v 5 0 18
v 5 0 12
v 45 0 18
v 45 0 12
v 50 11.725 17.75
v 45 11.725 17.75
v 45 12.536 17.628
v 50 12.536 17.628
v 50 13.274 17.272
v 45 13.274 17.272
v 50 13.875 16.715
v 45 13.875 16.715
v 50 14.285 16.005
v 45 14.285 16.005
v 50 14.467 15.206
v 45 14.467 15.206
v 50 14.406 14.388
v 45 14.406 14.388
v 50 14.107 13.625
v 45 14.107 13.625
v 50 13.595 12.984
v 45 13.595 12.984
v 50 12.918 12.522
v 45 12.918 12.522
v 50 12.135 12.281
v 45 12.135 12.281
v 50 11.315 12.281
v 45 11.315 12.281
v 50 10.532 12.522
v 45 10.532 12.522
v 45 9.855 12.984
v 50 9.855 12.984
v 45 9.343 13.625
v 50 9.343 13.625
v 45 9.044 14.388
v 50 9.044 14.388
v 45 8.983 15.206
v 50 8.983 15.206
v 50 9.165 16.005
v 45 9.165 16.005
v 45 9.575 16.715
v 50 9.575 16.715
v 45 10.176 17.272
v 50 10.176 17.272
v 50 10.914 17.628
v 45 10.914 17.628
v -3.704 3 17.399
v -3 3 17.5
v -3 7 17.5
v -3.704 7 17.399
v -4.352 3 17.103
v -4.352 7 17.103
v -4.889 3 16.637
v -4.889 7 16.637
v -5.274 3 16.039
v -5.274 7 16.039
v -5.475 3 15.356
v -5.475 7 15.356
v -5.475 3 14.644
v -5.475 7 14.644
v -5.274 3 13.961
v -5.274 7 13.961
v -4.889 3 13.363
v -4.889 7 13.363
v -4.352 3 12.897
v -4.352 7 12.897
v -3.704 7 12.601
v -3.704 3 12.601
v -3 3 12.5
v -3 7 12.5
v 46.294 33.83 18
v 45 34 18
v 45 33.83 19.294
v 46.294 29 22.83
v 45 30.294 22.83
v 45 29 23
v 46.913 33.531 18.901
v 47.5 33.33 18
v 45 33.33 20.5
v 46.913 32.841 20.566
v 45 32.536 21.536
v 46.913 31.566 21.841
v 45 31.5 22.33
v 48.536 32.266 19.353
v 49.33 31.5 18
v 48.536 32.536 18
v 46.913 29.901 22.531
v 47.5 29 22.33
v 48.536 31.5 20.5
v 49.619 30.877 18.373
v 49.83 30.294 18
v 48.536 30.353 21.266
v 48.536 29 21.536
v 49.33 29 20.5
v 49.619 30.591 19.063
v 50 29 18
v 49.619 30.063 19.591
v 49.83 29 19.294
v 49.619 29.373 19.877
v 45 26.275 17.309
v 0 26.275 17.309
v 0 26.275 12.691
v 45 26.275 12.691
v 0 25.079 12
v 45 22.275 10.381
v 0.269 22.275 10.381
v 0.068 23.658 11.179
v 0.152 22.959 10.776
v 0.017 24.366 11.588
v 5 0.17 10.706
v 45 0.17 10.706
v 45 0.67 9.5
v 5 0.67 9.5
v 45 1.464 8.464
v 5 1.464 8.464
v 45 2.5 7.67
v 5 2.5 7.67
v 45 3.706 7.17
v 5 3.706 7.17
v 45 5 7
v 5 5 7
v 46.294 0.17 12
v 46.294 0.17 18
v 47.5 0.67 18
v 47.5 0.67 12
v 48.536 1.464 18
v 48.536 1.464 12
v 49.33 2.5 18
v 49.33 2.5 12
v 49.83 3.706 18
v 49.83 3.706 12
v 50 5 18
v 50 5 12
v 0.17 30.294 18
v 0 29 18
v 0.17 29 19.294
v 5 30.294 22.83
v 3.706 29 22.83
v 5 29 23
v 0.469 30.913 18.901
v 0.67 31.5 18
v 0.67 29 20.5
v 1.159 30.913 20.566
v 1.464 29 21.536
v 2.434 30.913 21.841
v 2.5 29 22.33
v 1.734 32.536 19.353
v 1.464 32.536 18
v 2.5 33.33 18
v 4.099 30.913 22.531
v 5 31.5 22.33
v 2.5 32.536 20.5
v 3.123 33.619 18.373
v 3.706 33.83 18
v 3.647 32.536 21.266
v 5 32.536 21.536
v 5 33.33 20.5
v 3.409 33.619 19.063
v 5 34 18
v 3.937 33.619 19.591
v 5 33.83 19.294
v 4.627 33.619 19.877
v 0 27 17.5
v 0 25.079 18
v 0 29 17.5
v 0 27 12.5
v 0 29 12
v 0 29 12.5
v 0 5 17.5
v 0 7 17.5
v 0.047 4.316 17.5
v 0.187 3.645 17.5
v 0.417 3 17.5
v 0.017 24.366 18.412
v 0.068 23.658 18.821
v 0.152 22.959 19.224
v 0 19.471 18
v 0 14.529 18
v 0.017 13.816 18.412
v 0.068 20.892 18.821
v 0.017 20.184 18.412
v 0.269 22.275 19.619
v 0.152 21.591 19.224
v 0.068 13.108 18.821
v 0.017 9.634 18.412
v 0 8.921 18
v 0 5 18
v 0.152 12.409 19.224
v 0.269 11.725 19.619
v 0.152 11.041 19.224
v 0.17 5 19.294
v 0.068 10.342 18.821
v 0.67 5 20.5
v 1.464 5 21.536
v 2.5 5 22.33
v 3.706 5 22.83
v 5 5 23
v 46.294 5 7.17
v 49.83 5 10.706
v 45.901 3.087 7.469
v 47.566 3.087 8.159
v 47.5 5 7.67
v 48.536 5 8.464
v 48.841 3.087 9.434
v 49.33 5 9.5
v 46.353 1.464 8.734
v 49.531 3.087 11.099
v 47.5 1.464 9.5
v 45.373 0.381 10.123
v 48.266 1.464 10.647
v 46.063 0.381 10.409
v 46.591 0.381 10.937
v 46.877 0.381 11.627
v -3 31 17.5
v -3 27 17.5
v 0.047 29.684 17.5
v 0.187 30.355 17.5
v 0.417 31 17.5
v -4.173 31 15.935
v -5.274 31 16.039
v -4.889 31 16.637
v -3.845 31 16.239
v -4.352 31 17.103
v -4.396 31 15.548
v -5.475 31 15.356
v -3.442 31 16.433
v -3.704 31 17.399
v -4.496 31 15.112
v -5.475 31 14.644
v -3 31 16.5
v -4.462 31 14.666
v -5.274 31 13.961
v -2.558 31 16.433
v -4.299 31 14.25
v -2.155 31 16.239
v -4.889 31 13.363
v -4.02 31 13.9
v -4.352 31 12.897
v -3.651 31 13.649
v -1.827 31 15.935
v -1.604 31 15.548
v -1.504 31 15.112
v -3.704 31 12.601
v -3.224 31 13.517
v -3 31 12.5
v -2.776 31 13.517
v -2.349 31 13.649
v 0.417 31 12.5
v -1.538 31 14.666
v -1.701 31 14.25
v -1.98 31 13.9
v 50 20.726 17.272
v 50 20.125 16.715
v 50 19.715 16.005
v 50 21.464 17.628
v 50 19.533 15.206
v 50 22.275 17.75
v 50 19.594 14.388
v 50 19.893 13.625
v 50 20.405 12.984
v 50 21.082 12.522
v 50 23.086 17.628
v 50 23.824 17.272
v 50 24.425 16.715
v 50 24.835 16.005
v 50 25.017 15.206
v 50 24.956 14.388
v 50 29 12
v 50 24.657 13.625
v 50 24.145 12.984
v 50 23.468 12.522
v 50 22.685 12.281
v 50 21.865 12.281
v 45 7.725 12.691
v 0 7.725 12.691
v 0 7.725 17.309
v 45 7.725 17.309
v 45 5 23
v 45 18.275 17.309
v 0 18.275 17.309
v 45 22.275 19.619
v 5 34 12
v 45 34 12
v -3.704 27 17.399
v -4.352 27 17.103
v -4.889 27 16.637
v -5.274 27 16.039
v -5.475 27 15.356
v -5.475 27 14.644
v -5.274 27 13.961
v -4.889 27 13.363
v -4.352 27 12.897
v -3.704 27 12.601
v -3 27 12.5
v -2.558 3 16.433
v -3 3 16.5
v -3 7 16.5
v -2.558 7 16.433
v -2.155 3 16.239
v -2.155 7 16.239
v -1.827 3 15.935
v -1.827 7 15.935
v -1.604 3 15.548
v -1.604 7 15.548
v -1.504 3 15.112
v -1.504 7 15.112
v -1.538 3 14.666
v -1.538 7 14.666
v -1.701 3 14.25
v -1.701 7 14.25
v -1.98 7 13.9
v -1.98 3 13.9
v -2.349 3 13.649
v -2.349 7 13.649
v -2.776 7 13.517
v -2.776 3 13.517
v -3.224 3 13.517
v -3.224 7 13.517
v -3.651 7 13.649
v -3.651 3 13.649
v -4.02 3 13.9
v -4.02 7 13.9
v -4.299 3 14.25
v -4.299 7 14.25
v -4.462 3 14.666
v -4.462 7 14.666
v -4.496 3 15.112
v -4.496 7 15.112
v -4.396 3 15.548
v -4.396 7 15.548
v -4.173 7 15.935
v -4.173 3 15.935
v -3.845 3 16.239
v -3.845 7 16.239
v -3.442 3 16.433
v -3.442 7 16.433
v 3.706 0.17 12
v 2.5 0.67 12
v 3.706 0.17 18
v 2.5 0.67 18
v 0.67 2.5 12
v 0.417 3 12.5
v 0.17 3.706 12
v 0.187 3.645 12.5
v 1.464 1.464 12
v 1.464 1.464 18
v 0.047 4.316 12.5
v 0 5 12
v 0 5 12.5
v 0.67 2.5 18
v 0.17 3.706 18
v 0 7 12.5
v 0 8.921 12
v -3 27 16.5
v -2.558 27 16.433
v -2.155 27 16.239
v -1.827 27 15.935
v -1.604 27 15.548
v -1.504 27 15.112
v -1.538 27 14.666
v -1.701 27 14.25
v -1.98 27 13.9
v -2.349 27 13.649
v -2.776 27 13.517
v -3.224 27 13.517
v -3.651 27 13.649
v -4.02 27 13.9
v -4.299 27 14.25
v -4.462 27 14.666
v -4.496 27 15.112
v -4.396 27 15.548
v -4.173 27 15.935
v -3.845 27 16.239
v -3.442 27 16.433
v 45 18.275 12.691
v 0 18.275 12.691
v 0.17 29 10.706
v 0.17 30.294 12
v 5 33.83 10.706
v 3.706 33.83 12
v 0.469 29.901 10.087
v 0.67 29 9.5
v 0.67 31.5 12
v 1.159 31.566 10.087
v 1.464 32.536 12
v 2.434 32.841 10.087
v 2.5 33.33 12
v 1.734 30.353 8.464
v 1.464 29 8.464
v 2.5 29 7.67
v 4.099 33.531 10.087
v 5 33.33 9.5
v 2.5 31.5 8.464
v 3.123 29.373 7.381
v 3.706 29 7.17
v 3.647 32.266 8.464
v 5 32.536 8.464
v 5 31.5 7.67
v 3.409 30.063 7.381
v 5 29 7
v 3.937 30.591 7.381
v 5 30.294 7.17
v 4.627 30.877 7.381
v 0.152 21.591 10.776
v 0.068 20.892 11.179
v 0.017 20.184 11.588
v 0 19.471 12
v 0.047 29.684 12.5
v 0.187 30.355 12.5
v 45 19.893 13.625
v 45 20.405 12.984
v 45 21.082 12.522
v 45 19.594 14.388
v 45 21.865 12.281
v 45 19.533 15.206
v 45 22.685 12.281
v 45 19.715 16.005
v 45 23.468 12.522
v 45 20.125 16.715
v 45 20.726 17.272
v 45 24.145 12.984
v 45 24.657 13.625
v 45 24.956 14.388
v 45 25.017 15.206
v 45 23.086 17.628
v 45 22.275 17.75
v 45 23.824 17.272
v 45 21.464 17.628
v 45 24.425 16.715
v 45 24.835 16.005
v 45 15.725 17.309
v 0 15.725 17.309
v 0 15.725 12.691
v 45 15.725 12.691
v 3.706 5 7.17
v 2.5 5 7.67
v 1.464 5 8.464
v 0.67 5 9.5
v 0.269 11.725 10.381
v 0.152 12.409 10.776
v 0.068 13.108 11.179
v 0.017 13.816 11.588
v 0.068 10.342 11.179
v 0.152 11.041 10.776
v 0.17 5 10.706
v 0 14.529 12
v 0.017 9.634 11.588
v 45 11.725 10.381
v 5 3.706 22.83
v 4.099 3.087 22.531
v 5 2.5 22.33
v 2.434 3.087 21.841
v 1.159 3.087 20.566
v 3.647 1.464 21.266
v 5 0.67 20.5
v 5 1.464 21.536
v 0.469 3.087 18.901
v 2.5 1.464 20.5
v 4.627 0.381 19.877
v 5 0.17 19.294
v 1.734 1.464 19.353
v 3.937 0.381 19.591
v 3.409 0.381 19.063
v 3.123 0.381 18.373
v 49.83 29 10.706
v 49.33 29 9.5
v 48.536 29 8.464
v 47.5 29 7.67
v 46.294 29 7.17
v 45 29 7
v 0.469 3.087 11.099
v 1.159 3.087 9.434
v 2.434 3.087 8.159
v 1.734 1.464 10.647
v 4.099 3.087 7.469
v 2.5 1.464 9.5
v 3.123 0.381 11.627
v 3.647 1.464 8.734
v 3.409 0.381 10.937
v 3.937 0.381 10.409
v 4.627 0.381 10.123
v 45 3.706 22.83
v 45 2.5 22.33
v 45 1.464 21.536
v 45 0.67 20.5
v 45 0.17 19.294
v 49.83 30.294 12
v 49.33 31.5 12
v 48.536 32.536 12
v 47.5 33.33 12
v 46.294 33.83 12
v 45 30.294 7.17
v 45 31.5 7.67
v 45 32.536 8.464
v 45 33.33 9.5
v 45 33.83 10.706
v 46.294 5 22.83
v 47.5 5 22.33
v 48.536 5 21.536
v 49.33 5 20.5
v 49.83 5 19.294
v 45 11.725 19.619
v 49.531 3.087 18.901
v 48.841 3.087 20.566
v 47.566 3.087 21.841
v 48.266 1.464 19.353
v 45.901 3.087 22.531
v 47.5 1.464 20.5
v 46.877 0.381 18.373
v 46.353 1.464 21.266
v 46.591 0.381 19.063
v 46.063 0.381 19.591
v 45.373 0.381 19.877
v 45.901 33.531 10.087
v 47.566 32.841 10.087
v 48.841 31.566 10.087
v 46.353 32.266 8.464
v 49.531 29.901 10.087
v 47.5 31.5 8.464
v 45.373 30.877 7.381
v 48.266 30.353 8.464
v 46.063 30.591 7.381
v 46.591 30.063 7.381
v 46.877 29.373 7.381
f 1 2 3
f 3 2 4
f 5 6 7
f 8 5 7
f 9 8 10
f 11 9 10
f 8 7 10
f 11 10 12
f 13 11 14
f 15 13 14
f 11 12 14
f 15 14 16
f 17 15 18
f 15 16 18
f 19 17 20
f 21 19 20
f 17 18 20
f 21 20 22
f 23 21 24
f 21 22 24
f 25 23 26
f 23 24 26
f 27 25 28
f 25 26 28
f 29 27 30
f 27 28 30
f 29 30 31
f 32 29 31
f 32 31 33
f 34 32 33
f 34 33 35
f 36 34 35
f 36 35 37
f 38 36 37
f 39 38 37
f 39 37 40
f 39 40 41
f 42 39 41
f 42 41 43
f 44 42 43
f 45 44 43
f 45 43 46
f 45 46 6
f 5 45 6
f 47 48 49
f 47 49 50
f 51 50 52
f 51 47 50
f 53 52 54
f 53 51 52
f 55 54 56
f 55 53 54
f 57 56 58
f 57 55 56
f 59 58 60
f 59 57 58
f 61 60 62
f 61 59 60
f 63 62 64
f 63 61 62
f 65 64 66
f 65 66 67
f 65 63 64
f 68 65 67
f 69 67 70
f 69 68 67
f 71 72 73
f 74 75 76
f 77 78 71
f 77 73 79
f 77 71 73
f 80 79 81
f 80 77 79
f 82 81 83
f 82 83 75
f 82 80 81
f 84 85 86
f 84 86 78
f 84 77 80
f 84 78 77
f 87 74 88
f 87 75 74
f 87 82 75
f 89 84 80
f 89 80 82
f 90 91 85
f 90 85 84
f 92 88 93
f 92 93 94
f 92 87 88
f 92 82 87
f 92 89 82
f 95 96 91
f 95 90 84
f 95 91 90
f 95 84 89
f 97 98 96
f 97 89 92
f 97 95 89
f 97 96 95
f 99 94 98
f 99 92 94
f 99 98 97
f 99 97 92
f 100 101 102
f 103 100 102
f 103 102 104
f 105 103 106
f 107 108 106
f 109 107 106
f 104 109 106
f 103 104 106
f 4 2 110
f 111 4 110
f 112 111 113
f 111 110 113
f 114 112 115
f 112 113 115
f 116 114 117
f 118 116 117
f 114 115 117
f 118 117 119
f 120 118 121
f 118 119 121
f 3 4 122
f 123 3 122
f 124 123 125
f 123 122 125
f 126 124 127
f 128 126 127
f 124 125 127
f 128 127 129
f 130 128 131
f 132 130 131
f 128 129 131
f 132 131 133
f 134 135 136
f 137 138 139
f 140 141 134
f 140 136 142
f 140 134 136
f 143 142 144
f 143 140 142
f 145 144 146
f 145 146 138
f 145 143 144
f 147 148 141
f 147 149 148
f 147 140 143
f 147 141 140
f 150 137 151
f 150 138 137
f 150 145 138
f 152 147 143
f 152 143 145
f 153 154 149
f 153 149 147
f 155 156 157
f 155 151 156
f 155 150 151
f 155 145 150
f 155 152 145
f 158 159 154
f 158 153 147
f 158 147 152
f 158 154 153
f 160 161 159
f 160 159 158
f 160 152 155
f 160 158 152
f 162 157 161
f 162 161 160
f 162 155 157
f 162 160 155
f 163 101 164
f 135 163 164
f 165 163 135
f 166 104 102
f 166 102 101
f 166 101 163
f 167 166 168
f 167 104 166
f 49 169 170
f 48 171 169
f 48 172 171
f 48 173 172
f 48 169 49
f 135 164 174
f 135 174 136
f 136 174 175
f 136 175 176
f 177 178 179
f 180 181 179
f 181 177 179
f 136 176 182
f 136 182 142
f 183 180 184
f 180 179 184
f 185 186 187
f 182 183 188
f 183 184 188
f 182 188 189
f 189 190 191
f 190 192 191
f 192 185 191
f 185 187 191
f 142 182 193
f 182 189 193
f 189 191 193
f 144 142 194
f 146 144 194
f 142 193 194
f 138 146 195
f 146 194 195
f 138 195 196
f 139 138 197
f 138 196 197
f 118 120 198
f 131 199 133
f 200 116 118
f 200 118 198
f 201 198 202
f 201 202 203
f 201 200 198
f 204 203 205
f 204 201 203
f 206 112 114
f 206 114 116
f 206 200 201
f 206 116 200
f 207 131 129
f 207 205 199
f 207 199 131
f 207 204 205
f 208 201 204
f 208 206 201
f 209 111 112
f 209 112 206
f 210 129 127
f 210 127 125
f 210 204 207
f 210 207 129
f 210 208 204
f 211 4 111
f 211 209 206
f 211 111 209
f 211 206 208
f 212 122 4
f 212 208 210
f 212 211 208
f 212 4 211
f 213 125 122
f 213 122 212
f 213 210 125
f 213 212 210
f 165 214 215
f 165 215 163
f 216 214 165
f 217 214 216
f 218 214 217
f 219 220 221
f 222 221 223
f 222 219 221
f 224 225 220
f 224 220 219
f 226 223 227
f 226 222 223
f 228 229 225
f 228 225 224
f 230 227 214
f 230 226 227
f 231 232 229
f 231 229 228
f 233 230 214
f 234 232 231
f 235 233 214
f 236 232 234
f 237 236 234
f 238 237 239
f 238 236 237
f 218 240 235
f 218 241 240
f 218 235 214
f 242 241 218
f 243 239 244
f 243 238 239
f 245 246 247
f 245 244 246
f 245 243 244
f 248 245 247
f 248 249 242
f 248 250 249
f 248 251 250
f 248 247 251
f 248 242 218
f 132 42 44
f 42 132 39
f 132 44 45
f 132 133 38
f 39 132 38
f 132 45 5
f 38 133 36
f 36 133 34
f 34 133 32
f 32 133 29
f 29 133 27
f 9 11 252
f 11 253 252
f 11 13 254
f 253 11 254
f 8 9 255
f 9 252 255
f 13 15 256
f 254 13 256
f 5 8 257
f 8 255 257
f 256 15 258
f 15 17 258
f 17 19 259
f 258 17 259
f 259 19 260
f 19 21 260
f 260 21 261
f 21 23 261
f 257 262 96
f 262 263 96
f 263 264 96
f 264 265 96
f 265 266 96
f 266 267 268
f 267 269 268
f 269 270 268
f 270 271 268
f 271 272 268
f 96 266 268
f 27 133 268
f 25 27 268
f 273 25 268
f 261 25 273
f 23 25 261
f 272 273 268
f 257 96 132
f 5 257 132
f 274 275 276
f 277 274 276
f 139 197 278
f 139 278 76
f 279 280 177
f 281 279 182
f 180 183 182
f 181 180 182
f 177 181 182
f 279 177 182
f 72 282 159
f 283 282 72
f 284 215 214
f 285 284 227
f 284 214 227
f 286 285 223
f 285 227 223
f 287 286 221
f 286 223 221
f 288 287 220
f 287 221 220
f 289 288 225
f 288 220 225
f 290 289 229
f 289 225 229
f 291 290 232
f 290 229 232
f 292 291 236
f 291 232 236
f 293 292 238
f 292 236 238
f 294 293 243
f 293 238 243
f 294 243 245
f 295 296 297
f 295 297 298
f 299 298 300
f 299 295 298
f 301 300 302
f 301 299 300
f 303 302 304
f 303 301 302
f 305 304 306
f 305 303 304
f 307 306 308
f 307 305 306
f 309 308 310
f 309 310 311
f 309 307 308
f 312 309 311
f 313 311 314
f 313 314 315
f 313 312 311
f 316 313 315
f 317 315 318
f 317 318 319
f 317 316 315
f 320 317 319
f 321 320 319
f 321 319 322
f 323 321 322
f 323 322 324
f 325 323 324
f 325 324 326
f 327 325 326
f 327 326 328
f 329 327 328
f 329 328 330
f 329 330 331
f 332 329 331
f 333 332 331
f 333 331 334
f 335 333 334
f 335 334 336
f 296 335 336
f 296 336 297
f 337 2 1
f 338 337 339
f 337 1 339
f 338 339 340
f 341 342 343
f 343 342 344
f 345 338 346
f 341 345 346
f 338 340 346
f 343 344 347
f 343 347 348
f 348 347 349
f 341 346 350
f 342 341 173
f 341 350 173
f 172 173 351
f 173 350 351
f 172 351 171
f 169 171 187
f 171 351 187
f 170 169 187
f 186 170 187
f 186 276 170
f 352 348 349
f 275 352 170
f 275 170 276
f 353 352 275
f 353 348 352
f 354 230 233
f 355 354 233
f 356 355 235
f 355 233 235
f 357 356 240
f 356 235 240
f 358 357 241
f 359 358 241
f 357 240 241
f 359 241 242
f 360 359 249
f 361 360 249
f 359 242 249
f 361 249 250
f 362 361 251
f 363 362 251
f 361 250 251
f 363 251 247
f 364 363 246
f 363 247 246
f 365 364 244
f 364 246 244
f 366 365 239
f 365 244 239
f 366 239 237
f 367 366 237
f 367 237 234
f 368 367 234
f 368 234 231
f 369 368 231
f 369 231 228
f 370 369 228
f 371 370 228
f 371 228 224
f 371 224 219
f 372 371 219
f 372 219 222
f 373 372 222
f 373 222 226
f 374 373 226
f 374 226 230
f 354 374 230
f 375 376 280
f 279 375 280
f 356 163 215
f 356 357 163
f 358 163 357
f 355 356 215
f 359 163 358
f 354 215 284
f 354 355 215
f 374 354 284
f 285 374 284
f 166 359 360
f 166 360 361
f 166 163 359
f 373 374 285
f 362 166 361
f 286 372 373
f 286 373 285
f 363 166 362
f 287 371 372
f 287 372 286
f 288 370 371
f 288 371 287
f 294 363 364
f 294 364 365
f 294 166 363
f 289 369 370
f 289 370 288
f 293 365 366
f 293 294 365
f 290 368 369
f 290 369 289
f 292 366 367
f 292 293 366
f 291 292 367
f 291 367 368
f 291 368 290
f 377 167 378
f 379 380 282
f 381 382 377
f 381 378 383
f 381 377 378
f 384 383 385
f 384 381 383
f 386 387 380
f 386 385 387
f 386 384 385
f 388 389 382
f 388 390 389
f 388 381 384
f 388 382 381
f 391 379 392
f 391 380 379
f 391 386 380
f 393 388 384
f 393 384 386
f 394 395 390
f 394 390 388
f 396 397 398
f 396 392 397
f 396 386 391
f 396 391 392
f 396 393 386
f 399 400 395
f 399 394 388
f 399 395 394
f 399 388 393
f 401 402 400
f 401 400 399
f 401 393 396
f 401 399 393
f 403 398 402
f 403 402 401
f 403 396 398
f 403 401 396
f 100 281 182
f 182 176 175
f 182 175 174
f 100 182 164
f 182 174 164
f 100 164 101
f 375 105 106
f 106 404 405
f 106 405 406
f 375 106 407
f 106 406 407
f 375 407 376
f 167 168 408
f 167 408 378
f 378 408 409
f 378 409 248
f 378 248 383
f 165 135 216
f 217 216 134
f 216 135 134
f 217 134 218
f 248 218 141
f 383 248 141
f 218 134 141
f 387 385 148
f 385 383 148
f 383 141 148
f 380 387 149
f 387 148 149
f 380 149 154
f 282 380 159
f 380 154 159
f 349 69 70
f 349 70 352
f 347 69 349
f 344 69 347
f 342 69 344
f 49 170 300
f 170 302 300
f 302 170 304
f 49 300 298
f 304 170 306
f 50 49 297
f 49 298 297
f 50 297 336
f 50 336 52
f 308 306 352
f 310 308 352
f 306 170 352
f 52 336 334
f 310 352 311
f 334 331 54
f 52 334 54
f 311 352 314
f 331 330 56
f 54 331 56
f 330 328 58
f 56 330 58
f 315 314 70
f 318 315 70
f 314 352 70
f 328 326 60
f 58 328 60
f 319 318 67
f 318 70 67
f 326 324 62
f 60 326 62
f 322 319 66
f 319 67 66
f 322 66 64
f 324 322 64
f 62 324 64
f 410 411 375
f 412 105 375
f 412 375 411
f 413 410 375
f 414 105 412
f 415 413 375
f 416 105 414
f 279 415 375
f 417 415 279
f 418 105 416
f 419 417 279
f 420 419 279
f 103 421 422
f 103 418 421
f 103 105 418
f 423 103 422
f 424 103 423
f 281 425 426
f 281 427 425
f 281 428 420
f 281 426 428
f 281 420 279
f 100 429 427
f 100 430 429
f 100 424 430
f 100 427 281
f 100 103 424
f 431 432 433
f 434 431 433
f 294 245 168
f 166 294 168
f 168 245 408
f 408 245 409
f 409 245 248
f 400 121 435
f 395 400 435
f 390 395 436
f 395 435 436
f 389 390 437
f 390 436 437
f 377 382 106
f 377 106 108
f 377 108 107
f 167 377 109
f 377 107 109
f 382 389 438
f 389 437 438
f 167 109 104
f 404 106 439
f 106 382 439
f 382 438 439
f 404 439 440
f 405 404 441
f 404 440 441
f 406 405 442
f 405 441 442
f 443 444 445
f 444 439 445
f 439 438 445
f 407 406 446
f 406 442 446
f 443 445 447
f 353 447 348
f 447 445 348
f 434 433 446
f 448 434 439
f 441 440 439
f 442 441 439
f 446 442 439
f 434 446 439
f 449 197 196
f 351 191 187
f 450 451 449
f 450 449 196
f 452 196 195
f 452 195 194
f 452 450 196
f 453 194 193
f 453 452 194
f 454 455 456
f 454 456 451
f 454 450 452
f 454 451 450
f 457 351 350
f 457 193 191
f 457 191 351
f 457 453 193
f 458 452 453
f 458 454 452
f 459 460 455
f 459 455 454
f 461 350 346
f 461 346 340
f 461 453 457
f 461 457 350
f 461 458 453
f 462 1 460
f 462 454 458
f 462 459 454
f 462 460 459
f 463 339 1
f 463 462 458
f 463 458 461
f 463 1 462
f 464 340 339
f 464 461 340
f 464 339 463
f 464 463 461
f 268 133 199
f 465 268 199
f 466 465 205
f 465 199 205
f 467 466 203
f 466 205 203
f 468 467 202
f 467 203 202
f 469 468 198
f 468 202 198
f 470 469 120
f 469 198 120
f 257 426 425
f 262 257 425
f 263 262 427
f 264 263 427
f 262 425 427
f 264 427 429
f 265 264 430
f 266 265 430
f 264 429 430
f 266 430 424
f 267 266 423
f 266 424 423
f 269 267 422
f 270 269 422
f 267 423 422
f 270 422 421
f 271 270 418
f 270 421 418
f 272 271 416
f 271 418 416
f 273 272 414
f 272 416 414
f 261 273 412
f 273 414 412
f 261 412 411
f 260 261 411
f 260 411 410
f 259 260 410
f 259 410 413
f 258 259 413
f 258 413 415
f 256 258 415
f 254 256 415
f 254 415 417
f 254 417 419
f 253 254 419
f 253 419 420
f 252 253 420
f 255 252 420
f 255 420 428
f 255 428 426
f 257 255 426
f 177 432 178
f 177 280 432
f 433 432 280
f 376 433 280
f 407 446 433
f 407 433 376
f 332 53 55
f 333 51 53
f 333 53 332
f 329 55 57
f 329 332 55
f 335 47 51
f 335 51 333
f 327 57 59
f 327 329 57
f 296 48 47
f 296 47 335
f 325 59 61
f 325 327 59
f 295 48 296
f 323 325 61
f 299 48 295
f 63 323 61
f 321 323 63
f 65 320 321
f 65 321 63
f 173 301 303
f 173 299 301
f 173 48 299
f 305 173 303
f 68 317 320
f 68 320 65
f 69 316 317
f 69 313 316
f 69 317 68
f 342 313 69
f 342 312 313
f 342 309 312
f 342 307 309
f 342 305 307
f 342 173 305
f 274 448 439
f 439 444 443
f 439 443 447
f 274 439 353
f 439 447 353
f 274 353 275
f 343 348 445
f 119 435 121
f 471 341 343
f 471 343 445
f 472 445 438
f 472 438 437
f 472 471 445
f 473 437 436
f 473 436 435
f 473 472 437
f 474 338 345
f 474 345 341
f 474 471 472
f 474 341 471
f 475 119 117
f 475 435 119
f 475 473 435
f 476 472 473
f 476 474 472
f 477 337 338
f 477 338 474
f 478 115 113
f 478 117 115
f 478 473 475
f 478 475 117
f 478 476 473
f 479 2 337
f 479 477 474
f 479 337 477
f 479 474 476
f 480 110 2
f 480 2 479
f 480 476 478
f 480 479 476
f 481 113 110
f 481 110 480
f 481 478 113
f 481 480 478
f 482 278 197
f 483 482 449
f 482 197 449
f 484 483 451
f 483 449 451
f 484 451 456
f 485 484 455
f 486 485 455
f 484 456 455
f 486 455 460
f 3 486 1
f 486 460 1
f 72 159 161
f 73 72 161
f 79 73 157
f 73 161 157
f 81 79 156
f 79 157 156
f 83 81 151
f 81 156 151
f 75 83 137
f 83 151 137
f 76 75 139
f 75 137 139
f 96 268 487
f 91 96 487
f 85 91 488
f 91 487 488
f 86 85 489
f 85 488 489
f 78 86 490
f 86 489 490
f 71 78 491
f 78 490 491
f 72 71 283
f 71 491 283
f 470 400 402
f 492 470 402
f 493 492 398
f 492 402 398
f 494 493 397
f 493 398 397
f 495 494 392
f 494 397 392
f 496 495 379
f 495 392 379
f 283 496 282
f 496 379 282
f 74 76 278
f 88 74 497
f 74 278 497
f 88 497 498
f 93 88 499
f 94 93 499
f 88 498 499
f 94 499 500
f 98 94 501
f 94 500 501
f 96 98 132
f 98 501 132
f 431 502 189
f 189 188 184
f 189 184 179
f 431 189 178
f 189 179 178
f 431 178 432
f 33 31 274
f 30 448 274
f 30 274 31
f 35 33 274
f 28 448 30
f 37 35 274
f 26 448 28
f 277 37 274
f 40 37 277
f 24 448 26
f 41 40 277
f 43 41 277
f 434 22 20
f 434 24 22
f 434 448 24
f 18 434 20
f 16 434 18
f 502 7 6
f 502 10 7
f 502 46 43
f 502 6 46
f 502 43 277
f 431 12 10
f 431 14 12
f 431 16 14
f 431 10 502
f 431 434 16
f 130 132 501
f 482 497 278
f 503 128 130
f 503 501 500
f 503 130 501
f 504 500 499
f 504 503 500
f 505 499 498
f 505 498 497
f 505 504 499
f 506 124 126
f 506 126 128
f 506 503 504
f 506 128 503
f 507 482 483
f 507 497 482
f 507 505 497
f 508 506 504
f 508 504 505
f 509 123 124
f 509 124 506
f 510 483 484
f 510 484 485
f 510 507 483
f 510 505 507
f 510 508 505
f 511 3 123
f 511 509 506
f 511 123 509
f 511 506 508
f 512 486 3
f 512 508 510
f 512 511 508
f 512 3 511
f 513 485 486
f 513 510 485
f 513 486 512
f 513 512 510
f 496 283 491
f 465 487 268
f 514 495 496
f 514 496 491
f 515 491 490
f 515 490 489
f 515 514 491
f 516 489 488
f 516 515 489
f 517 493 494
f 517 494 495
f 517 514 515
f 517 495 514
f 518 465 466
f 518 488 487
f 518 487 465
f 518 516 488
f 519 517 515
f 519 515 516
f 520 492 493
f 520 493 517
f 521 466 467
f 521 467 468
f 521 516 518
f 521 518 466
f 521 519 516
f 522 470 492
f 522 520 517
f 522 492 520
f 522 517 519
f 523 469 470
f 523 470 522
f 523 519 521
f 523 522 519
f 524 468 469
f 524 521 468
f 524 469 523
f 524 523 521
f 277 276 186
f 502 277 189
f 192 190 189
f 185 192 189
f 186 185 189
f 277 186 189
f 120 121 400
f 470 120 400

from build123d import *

# Parameters (mm, degrees)
ESQUISSE1_W              = 50
ESQUISSE1_H              = 34
BOSS_EXTRU_1_DEPTH       = 30
ESQUISSE10_R             = 1.5
BOSS_EXTRU_3_DEPTH       = 7
ENL_V_MAT_EXTRU_6_DEPTH  = 45
ESQUISSE12_R             = 2.75
ENL_V_MAT_EXTRU_7_DEPTH  = 68.498148123
ESQUISSE13_W             = 7
ESQUISSE13_H             = 34
ENL_V_MAT_EXTRU_8_DEPTH  = 68.498148123
ESQUISSE15_W             = 7.132262806
ESQUISSE15_H             = 5.57489061
ENL_V_MAT_EXTRU_9_DEPTH  = 3
ENL_V_MAT_EXTRU_10_DEPTH = 3
CONG_1_R                 = 5


with BuildPart() as part:
    # Esquisse1 → Boss.-Extru.1 (new body)
    with BuildSketch(Plane.XY):
        with Locations((25, 17)):
            Rectangle(ESQUISSE1_W, ESQUISSE1_H)
    extrude(amount=BOSS_EXTRU_1_DEPTH)

    # Esquisse10 → Boss.-Extru.3 (add)
    with BuildSketch(Plane(origin=(0, 34, 0), x_dir=(1, 0, 0), z_dir=(0, 1, 0))):
        with BuildLine():
            Line((0, -12.5), (0, -17.5))
            Line((0, -17.5), (-3, -17.5))
            ThreePointArc((-3, -17.5), (-5.5, -15), (-3, -12.5))
            Line((-3, -12.5), (0, -12.5))
        make_face()
        with Locations(Location((-3, -15, 0), (0, 0, 270))):
            Circle(ESQUISSE10_R, mode=Mode.SUBTRACT)
    boss_extru_3 = extrude(amount=-BOSS_EXTRU_3_DEPTH)

    # Symétrie2: Boss.-Extru.3 across plane
    add(boss_extru_3.mirror(Plane.ZX.offset(17)))

    # Esquisse11 → Enlèv. mat.-Extru.6 (cut)
    with BuildSketch(Plane.ZY):
        Polygon((10.381197846, 11.725), (12.690598923, 7.725), (17.309401077, 7.725), (19.618802154, 11.725), (17.309401077, 15.725), (12.690598923, 15.725), align=None)
        Polygon((10.381197846, 22.275), (12.690598923, 18.275), (17.309401077, 18.275), (19.618802154, 22.275), (17.309401077, 26.275), (12.690598923, 26.275), align=None)
    extrude(amount=-ENL_V_MAT_EXTRU_6_DEPTH, mode=Mode.SUBTRACT)

    # Esquisse12 → Enlèv. mat.-Extru.7 (cut, through all)
    with BuildSketch(Plane.ZY):
        with Locations((15, 11.725)):
            Circle(ESQUISSE12_R)
        with Locations((15, 22.275)):
            Circle(ESQUISSE12_R)
    extrude(amount=-ENL_V_MAT_EXTRU_7_DEPTH, mode=Mode.SUBTRACT)

    # Esquisse13 → Enlèv. mat.-Extru.8 (cut, through all)
    with BuildSketch(Plane.ZY):
        with Locations((3.5, 17)):
            Rectangle(ESQUISSE13_W, ESQUISSE13_H)
        with Locations((26.5, 17)):
            Rectangle(ESQUISSE13_W, ESQUISSE13_H)
    extrude(amount=-ENL_V_MAT_EXTRU_8_DEPTH, mode=Mode.SUBTRACT)

    # Esquisse15 → Enlèv. mat.-Extru.9 (cut)
    with BuildSketch(Plane(origin=(0, 34, 0), x_dir=(1, 0, 0), z_dir=(0, 1, 0))):
        with Locations((-3.566131403, -15.287445305)):
            Rectangle(ESQUISSE15_W, ESQUISSE15_H)
    extrude(amount=-ENL_V_MAT_EXTRU_9_DEPTH, mode=Mode.SUBTRACT)

    # Esquisse16 → Enlèv. mat.-Extru.10 (cut)
    with BuildSketch(Plane.XZ):
        Polygon((-3, 18.464101615), (-6, 16.732050808), (-6, 13.267949192), (-3, 11.535898385), (0, 11.535898385), (0, 13.267949192), (0, 16.732050808), (0, 18.464101615), align=None)
    extrude(amount=-ENL_V_MAT_EXTRU_10_DEPTH, mode=Mode.SUBTRACT)

    # Congé1
    # the kernel refuses this fillet: 5 mm, written as the material it takes off along each edge
    with BuildSketch(Plane(origin=(5, 29, 18), x_dir=(0, 0, 1), z_dir=(0, 1, 0))) as cong_1_piece_1_section:
        Polygon((0, 0), (CONG_1_R, 0), (CONG_1_R, -CONG_1_R), (0, -CONG_1_R), align=None)
    cong_1_piece_1 = extrude(amount=CONG_1_R, mode=Mode.PRIVATE)
    cong_1_piece_1 = cong_1_piece_1 - Plane(origin=(5, 29, 18), x_dir=(0.7071067811865475, 0, -0.7071067811865475), z_dir=(0, 1, 0)) * Sphere(CONG_1_R, mode=Mode.PRIVATE)
    add(cong_1_piece_1, mode=Mode.SUBTRACT)
    with BuildSketch(Plane(origin=(45, 29, 18), x_dir=(0, 1, 0), z_dir=(1, 0, 0))) as cong_1_piece_2_section:
        Polygon((0, 0), (CONG_1_R, 0), (CONG_1_R, CONG_1_R), (0, CONG_1_R), align=None)
    cong_1_piece_2 = extrude(amount=CONG_1_R, mode=Mode.PRIVATE)
    cong_1_piece_2 = cong_1_piece_2 - Plane(origin=(45, 29, 18), x_dir=(0, -0.7071067811865475, -0.7071067811865475), z_dir=(1, 0, 0)) * Sphere(CONG_1_R, mode=Mode.PRIVATE)
    add(cong_1_piece_2, mode=Mode.SUBTRACT)
    with BuildSketch(Plane(origin=(5, 29, 12), x_dir=(0, 1, 0), z_dir=(0, 0, -1))) as cong_1_piece_3_section:
        Polygon((0, 0), (CONG_1_R, 0), (CONG_1_R, -CONG_1_R), (0, -CONG_1_R), align=None)
    cong_1_piece_3 = extrude(amount=CONG_1_R, mode=Mode.PRIVATE)
    cong_1_piece_3 = cong_1_piece_3 - Plane(origin=(5, 29, 12), x_dir=(0.7071067811865475, -0.7071067811865475, 0), z_dir=(0, 0, -1)) * Sphere(CONG_1_R, mode=Mode.PRIVATE)
    add(cong_1_piece_3, mode=Mode.SUBTRACT)
    with BuildSketch(Plane(origin=(45, 29, 12), x_dir=(0, 1, 0), z_dir=(0, 0, -1))) as cong_1_piece_4_section:
        Polygon((0, 0), (CONG_1_R, 0), (CONG_1_R, CONG_1_R), (0, CONG_1_R), align=None)
    cong_1_piece_4 = extrude(amount=CONG_1_R, mode=Mode.PRIVATE)
    cong_1_piece_4 = cong_1_piece_4 - Plane(origin=(45, 29, 12), x_dir=(-0.7071067811865475, -0.7071067811865475, 0), z_dir=(0, 0, -1)) * Sphere(CONG_1_R, mode=Mode.PRIVATE)
    add(cong_1_piece_4, mode=Mode.SUBTRACT)
    with BuildSketch(Plane(origin=(5, 5, 12), x_dir=(0, 0, -1), z_dir=(0, -1, 0))) as cong_1_piece_5_section:
        Polygon((0, 0), (CONG_1_R, 0), (CONG_1_R, -CONG_1_R), (0, -CONG_1_R), align=None)
    cong_1_piece_5 = extrude(amount=CONG_1_R, mode=Mode.PRIVATE)
    cong_1_piece_5 = cong_1_piece_5 - Plane(origin=(5, 5, 12), x_dir=(0.7071067811865475, 0, 0.7071067811865475), z_dir=(0, -1, 0)) * Sphere(CONG_1_R, mode=Mode.PRIVATE)
    add(cong_1_piece_5, mode=Mode.SUBTRACT)
    with BuildSketch(Plane(origin=(45, 5, 12), x_dir=(0, 0, -1), z_dir=(0, -1, 0))) as cong_1_piece_6_section:
        Polygon((0, 0), (CONG_1_R, 0), (CONG_1_R, CONG_1_R), (0, CONG_1_R), align=None)
    cong_1_piece_6 = extrude(amount=CONG_1_R, mode=Mode.PRIVATE)
    cong_1_piece_6 = cong_1_piece_6 - Plane(origin=(45, 5, 12), x_dir=(-0.7071067811865475, 0, 0.7071067811865475), z_dir=(0, -1, 0)) * Sphere(CONG_1_R, mode=Mode.PRIVATE)
    add(cong_1_piece_6, mode=Mode.SUBTRACT)
    with BuildSketch(Plane(origin=(5, 5, 18), x_dir=(0, 0, 1), z_dir=(0, -1, 0))) as cong_1_piece_7_section:
        Polygon((0, 0), (CONG_1_R, 0), (CONG_1_R, CONG_1_R), (0, CONG_1_R), align=None)
    cong_1_piece_7 = extrude(amount=CONG_1_R, mode=Mode.PRIVATE)
    cong_1_piece_7 = cong_1_piece_7 - Plane(origin=(5, 5, 18), x_dir=(0.7071067811865475, 0, -0.7071067811865475), z_dir=(0, -1, 0)) * Sphere(CONG_1_R, mode=Mode.PRIVATE)
    add(cong_1_piece_7, mode=Mode.SUBTRACT)
    with BuildSketch(Plane(origin=(45, 5, 18), x_dir=(1, 0, 0), z_dir=(0, -1, 0))) as cong_1_piece_8_section:
        Polygon((0, 0), (CONG_1_R, 0), (CONG_1_R, CONG_1_R), (0, CONG_1_R), align=None)
    cong_1_piece_8 = extrude(amount=CONG_1_R, mode=Mode.PRIVATE)
    cong_1_piece_8 = cong_1_piece_8 - Plane(origin=(45, 5, 18), x_dir=(-0.7071067811865475, 0, -0.7071067811865475), z_dir=(0, -1, 0)) * Sphere(CONG_1_R, mode=Mode.PRIVATE)
    add(cong_1_piece_8, mode=Mode.SUBTRACT)
    with BuildSketch(Plane(origin=(5, 34, 23), x_dir=(0, 0, -1), z_dir=(1, 0, 0)), Plane(origin=(5, 0, 7), x_dir=(0, 0, 1), z_dir=(1, 0, 0))) as cong_1_piece_9:
        with BuildLine():
            CenterArc((CONG_1_R, -CONG_1_R), CONG_1_R, 90, 90)
            Line((0, -CONG_1_R), (0, 0))
            Line((0, 0), (CONG_1_R, 0))
        make_face()
    extrude(amount=40, mode=Mode.SUBTRACT)
    with BuildSketch(Plane(origin=(5, 34, 7), x_dir=(0, 0, 1), z_dir=(1, 0, 0)), Plane(origin=(5, 0, 23), x_dir=(0, 0, -1), z_dir=(1, 0, 0))) as cong_1_piece_10:
        with BuildLine():
            CenterArc((CONG_1_R, CONG_1_R), CONG_1_R, 180, 90)
            Line((0, CONG_1_R), (0, 0))
            Line((0, 0), (CONG_1_R, 0))
        make_face()
    extrude(amount=40, mode=Mode.SUBTRACT)
    with BuildSketch(Plane(origin=(0, 5, 23), x_dir=(1, 0, 0), z_dir=(0, 1, 0)), Plane(origin=(0, 5, 7), x_dir=(0, 0, 1), z_dir=(0, 1, 0)), Plane(origin=(50, 5, 23), x_dir=(0, 0, -1), z_dir=(0, 1, 0))) as cong_1_piece_11:
        with BuildLine():
            CenterArc((CONG_1_R, CONG_1_R), CONG_1_R, 180, 90)
            Line((0, CONG_1_R), (0, 0))
            Line((0, 0), (CONG_1_R, 0))
        make_face()
    extrude(amount=24, mode=Mode.SUBTRACT)
    with BuildSketch(Plane(origin=(0, 34, 18), x_dir=(1, 0, 0), z_dir=(0, 0, -1))) as cong_1_piece_12_section:
        with BuildLine():
            CenterArc((CONG_1_R, CONG_1_R), CONG_1_R, 180, 90)
            Line((0, CONG_1_R), (0, 0))
            Line((0, 0), (CONG_1_R, 0))
        make_face()
    cong_1_piece_12 = extrude(amount=6, mode=Mode.PRIVATE)
    cong_1_piece_12 = split(cong_1_piece_12, bisect_by=Plane(origin=(1.218725878, 33.074749682, 17.5), z_dir=(0, 0, 1)), keep=Keep.TOP, mode=Mode.PRIVATE)
    cong_1_piece_12 = split(cong_1_piece_12, bisect_by=Plane(origin=(1.218725878, 31, 17.75), z_dir=(0, 1, 0)), keep=Keep.TOP, mode=Mode.PRIVATE)
    add(cong_1_piece_12, mode=Mode.SUBTRACT)
    with BuildSketch(Plane(origin=(0, 34, 18), x_dir=(1, 0, 0), z_dir=(0, 0, -1))) as cong_1_piece_13_section:
        with BuildLine():
            CenterArc((CONG_1_R, CONG_1_R), CONG_1_R, 180, 90)
            Line((0, CONG_1_R), (0, 0))
            Line((0, 0), (CONG_1_R, 0))
        make_face()
    cong_1_piece_13 = extrude(amount=6, mode=Mode.PRIVATE)
    cong_1_piece_13 = split(cong_1_piece_13, bisect_by=Plane(origin=(0.05065924, 30.291256669, 17.5), z_dir=(0, 0, 1)), keep=Keep.TOP, mode=Mode.PRIVATE)
    cong_1_piece_13 = split(cong_1_piece_13, bisect_by=Plane(origin=(0.05065924, 31, 17.75), z_dir=(0, -1, 0)), keep=Keep.TOP, mode=Mode.PRIVATE)
    add(cong_1_piece_13, mode=Mode.SUBTRACT)
    with BuildSketch(Plane(origin=(0, 34, 18), x_dir=(1, 0, 0), z_dir=(0, 0, -1))) as cong_1_piece_14_section:
        with BuildLine():
            CenterArc((CONG_1_R, CONG_1_R), CONG_1_R, 180, 90)
            Line((0, CONG_1_R), (0, 0))
            Line((0, 0), (CONG_1_R, 0))
        make_face()
    cong_1_piece_14 = extrude(amount=6, mode=Mode.PRIVATE)
    cong_1_piece_14 = split(cong_1_piece_14, bisect_by=Plane(origin=(1.218725878, 33.074749682, 17.5), z_dir=(0, 0, -1)), keep=Keep.TOP, mode=Mode.PRIVATE)
    cong_1_piece_14 = split(cong_1_piece_14, bisect_by=Plane(origin=(1.218725878, 31, 15), z_dir=(0, 1, 0)), keep=Keep.TOP, mode=Mode.PRIVATE)
    cong_1_piece_14 = split(cong_1_piece_14, bisect_by=Plane(origin=(1.218725878, 33.074749682, 12.5), z_dir=(0, 0, 1)), keep=Keep.TOP, mode=Mode.PRIVATE)
    add(cong_1_piece_14, mode=Mode.SUBTRACT)
    with BuildSketch(Plane(origin=(0, 34, 18), x_dir=(1, 0, 0), z_dir=(0, 0, -1))) as cong_1_piece_15_section:
        with BuildLine():
            CenterArc((CONG_1_R, CONG_1_R), CONG_1_R, 180, 90)
            Line((0, CONG_1_R), (0, 0))
            Line((0, 0), (CONG_1_R, 0))
        make_face()
    cong_1_piece_15 = extrude(amount=6, mode=Mode.PRIVATE)
    cong_1_piece_15 = split(cong_1_piece_15, bisect_by=Plane(origin=(1.218725878, 31, 12.25), z_dir=(0, 1, 0)), keep=Keep.TOP, mode=Mode.PRIVATE)
    cong_1_piece_15 = split(cong_1_piece_15, bisect_by=Plane(origin=(1.218725878, 33.074749682, 12.5), z_dir=(0, 0, -1)), keep=Keep.TOP, mode=Mode.PRIVATE)
    add(cong_1_piece_15, mode=Mode.SUBTRACT)
    with BuildSketch(Plane(origin=(0, 34, 18), x_dir=(1, 0, 0), z_dir=(0, 0, -1))) as cong_1_piece_16_section:
        with BuildLine():
            CenterArc((CONG_1_R, CONG_1_R), CONG_1_R, 180, 90)
            Line((0, CONG_1_R), (0, 0))
            Line((0, 0), (CONG_1_R, 0))
        make_face()
    cong_1_piece_16 = extrude(amount=6, mode=Mode.PRIVATE)
    cong_1_piece_16 = split(cong_1_piece_16, bisect_by=Plane(origin=(0.05065924, 31, 12.25), z_dir=(0, -1, 0)), keep=Keep.TOP, mode=Mode.PRIVATE)
    cong_1_piece_16 = split(cong_1_piece_16, bisect_by=Plane(origin=(0.05065924, 30.291256669, 12.5), z_dir=(0, 0, -1)), keep=Keep.TOP, mode=Mode.PRIVATE)
    add(cong_1_piece_16, mode=Mode.SUBTRACT)
    with BuildSketch(Plane(origin=(0, 0, 18), x_dir=(1, 0, 0), z_dir=(0, 0, -1))) as cong_1_piece_17_section:
        with BuildLine():
            CenterArc((CONG_1_R, -CONG_1_R), CONG_1_R, 90, 90)
            Line((0, -CONG_1_R), (0, 0))
            Line((0, 0), (CONG_1_R, 0))
        make_face()
    cong_1_piece_17 = extrude(amount=6, mode=Mode.PRIVATE)
    cong_1_piece_17 = split(cong_1_piece_17, bisect_by=Plane(origin=(1.218725878, 3, 17.75), z_dir=(0, -1, 0)), keep=Keep.TOP, mode=Mode.PRIVATE)
    cong_1_piece_17 = split(cong_1_piece_17, bisect_by=Plane(origin=(1.218725878, 0.925250318, 17.5), z_dir=(0, 0, 1)), keep=Keep.TOP, mode=Mode.PRIVATE)
    add(cong_1_piece_17, mode=Mode.SUBTRACT)
    with BuildSketch(Plane(origin=(0, 0, 18), x_dir=(1, 0, 0), z_dir=(0, 0, -1))) as cong_1_piece_18_section:
        with BuildLine():
            CenterArc((CONG_1_R, -CONG_1_R), CONG_1_R, 90, 90)
            Line((0, -CONG_1_R), (0, 0))
            Line((0, 0), (CONG_1_R, 0))
        make_face()
    cong_1_piece_18 = extrude(amount=6, mode=Mode.PRIVATE)
    cong_1_piece_18 = split(cong_1_piece_18, bisect_by=Plane(origin=(0.05065924, 3, 17.75), z_dir=(0, 1, 0)), keep=Keep.TOP, mode=Mode.PRIVATE)
    cong_1_piece_18 = split(cong_1_piece_18, bisect_by=Plane(origin=(0.05065924, 3.708743331, 17.5), z_dir=(0, 0, 1)), keep=Keep.TOP, mode=Mode.PRIVATE)
    add(cong_1_piece_18, mode=Mode.SUBTRACT)
    with BuildSketch(Plane(origin=(0, 0, 18), x_dir=(1, 0, 0), z_dir=(0, 0, -1))) as cong_1_piece_19_section:
        with BuildLine():
            CenterArc((CONG_1_R, -CONG_1_R), CONG_1_R, 90, 90)
            Line((0, -CONG_1_R), (0, 0))
            Line((0, 0), (CONG_1_R, 0))
        make_face()
    cong_1_piece_19 = extrude(amount=6, mode=Mode.PRIVATE)
    cong_1_piece_19 = split(cong_1_piece_19, bisect_by=Plane(origin=(1.218725878, 0.925250318, 12.5), z_dir=(0, 0, 1)), keep=Keep.TOP, mode=Mode.PRIVATE)
    cong_1_piece_19 = split(cong_1_piece_19, bisect_by=Plane(origin=(1.218725878, 3, 15), z_dir=(0, -1, 0)), keep=Keep.TOP, mode=Mode.PRIVATE)
    cong_1_piece_19 = split(cong_1_piece_19, bisect_by=Plane(origin=(1.218725878, 0.925250318, 17.5), z_dir=(0, 0, -1)), keep=Keep.TOP, mode=Mode.PRIVATE)
    add(cong_1_piece_19, mode=Mode.SUBTRACT)
    with BuildSketch(Plane(origin=(0, 0, 18), x_dir=(1, 0, 0), z_dir=(0, 0, -1))) as cong_1_piece_20_section:
        with BuildLine():
            CenterArc((CONG_1_R, -CONG_1_R), CONG_1_R, 90, 90)
            Line((0, -CONG_1_R), (0, 0))
            Line((0, 0), (CONG_1_R, 0))
        make_face()
    cong_1_piece_20 = extrude(amount=6, mode=Mode.PRIVATE)
    cong_1_piece_20 = split(cong_1_piece_20, bisect_by=Plane(origin=(1.218725878, 0.925250318, 12.5), z_dir=(0, 0, -1)), keep=Keep.TOP, mode=Mode.PRIVATE)
    cong_1_piece_20 = split(cong_1_piece_20, bisect_by=Plane(origin=(1.218725878, 3, 12.25), z_dir=(0, -1, 0)), keep=Keep.TOP, mode=Mode.PRIVATE)
    add(cong_1_piece_20, mode=Mode.SUBTRACT)
    with BuildSketch(Plane(origin=(0, 0, 18), x_dir=(1, 0, 0), z_dir=(0, 0, -1))) as cong_1_piece_21_section:
        with BuildLine():
            CenterArc((CONG_1_R, -CONG_1_R), CONG_1_R, 90, 90)
            Line((0, -CONG_1_R), (0, 0))
            Line((0, 0), (CONG_1_R, 0))
        make_face()
    cong_1_piece_21 = extrude(amount=6, mode=Mode.PRIVATE)
    cong_1_piece_21 = split(cong_1_piece_21, bisect_by=Plane(origin=(0.05065924, 3.708743331, 12.5), z_dir=(0, 0, -1)), keep=Keep.TOP, mode=Mode.PRIVATE)
    cong_1_piece_21 = split(cong_1_piece_21, bisect_by=Plane(origin=(0.05065924, 3, 12.25), z_dir=(0, 1, 0)), keep=Keep.TOP, mode=Mode.PRIVATE)
    add(cong_1_piece_21, mode=Mode.SUBTRACT)
    with BuildSketch(Plane(origin=(50, 0, 12), x_dir=(-1, 0, 0), z_dir=(0, 0, 1)), Plane(origin=(50, 34, 12), x_dir=(0, -1, 0), z_dir=(0, 0, 1))) as cong_1_piece_22:
        with BuildLine():
            CenterArc((CONG_1_R, -CONG_1_R), CONG_1_R, 90, 90)
            Line((0, -CONG_1_R), (0, 0))
            Line((0, 0), (CONG_1_R, 0))
        make_face()
    extrude(amount=6, mode=Mode.SUBTRACT)
    with BuildSketch(Plane(origin=(50, 5, 7), x_dir=(0, 0, 1), z_dir=(0, 1, 0))) as cong_1_piece_23:
        with BuildLine():
            CenterArc((CONG_1_R, -CONG_1_R), CONG_1_R, 90, 90)
            Line((0, -CONG_1_R), (0, 0))
            Line((0, 0), (CONG_1_R, 0))
        make_face()
    extrude(amount=24, mode=Mode.SUBTRACT)


solid = part.part
